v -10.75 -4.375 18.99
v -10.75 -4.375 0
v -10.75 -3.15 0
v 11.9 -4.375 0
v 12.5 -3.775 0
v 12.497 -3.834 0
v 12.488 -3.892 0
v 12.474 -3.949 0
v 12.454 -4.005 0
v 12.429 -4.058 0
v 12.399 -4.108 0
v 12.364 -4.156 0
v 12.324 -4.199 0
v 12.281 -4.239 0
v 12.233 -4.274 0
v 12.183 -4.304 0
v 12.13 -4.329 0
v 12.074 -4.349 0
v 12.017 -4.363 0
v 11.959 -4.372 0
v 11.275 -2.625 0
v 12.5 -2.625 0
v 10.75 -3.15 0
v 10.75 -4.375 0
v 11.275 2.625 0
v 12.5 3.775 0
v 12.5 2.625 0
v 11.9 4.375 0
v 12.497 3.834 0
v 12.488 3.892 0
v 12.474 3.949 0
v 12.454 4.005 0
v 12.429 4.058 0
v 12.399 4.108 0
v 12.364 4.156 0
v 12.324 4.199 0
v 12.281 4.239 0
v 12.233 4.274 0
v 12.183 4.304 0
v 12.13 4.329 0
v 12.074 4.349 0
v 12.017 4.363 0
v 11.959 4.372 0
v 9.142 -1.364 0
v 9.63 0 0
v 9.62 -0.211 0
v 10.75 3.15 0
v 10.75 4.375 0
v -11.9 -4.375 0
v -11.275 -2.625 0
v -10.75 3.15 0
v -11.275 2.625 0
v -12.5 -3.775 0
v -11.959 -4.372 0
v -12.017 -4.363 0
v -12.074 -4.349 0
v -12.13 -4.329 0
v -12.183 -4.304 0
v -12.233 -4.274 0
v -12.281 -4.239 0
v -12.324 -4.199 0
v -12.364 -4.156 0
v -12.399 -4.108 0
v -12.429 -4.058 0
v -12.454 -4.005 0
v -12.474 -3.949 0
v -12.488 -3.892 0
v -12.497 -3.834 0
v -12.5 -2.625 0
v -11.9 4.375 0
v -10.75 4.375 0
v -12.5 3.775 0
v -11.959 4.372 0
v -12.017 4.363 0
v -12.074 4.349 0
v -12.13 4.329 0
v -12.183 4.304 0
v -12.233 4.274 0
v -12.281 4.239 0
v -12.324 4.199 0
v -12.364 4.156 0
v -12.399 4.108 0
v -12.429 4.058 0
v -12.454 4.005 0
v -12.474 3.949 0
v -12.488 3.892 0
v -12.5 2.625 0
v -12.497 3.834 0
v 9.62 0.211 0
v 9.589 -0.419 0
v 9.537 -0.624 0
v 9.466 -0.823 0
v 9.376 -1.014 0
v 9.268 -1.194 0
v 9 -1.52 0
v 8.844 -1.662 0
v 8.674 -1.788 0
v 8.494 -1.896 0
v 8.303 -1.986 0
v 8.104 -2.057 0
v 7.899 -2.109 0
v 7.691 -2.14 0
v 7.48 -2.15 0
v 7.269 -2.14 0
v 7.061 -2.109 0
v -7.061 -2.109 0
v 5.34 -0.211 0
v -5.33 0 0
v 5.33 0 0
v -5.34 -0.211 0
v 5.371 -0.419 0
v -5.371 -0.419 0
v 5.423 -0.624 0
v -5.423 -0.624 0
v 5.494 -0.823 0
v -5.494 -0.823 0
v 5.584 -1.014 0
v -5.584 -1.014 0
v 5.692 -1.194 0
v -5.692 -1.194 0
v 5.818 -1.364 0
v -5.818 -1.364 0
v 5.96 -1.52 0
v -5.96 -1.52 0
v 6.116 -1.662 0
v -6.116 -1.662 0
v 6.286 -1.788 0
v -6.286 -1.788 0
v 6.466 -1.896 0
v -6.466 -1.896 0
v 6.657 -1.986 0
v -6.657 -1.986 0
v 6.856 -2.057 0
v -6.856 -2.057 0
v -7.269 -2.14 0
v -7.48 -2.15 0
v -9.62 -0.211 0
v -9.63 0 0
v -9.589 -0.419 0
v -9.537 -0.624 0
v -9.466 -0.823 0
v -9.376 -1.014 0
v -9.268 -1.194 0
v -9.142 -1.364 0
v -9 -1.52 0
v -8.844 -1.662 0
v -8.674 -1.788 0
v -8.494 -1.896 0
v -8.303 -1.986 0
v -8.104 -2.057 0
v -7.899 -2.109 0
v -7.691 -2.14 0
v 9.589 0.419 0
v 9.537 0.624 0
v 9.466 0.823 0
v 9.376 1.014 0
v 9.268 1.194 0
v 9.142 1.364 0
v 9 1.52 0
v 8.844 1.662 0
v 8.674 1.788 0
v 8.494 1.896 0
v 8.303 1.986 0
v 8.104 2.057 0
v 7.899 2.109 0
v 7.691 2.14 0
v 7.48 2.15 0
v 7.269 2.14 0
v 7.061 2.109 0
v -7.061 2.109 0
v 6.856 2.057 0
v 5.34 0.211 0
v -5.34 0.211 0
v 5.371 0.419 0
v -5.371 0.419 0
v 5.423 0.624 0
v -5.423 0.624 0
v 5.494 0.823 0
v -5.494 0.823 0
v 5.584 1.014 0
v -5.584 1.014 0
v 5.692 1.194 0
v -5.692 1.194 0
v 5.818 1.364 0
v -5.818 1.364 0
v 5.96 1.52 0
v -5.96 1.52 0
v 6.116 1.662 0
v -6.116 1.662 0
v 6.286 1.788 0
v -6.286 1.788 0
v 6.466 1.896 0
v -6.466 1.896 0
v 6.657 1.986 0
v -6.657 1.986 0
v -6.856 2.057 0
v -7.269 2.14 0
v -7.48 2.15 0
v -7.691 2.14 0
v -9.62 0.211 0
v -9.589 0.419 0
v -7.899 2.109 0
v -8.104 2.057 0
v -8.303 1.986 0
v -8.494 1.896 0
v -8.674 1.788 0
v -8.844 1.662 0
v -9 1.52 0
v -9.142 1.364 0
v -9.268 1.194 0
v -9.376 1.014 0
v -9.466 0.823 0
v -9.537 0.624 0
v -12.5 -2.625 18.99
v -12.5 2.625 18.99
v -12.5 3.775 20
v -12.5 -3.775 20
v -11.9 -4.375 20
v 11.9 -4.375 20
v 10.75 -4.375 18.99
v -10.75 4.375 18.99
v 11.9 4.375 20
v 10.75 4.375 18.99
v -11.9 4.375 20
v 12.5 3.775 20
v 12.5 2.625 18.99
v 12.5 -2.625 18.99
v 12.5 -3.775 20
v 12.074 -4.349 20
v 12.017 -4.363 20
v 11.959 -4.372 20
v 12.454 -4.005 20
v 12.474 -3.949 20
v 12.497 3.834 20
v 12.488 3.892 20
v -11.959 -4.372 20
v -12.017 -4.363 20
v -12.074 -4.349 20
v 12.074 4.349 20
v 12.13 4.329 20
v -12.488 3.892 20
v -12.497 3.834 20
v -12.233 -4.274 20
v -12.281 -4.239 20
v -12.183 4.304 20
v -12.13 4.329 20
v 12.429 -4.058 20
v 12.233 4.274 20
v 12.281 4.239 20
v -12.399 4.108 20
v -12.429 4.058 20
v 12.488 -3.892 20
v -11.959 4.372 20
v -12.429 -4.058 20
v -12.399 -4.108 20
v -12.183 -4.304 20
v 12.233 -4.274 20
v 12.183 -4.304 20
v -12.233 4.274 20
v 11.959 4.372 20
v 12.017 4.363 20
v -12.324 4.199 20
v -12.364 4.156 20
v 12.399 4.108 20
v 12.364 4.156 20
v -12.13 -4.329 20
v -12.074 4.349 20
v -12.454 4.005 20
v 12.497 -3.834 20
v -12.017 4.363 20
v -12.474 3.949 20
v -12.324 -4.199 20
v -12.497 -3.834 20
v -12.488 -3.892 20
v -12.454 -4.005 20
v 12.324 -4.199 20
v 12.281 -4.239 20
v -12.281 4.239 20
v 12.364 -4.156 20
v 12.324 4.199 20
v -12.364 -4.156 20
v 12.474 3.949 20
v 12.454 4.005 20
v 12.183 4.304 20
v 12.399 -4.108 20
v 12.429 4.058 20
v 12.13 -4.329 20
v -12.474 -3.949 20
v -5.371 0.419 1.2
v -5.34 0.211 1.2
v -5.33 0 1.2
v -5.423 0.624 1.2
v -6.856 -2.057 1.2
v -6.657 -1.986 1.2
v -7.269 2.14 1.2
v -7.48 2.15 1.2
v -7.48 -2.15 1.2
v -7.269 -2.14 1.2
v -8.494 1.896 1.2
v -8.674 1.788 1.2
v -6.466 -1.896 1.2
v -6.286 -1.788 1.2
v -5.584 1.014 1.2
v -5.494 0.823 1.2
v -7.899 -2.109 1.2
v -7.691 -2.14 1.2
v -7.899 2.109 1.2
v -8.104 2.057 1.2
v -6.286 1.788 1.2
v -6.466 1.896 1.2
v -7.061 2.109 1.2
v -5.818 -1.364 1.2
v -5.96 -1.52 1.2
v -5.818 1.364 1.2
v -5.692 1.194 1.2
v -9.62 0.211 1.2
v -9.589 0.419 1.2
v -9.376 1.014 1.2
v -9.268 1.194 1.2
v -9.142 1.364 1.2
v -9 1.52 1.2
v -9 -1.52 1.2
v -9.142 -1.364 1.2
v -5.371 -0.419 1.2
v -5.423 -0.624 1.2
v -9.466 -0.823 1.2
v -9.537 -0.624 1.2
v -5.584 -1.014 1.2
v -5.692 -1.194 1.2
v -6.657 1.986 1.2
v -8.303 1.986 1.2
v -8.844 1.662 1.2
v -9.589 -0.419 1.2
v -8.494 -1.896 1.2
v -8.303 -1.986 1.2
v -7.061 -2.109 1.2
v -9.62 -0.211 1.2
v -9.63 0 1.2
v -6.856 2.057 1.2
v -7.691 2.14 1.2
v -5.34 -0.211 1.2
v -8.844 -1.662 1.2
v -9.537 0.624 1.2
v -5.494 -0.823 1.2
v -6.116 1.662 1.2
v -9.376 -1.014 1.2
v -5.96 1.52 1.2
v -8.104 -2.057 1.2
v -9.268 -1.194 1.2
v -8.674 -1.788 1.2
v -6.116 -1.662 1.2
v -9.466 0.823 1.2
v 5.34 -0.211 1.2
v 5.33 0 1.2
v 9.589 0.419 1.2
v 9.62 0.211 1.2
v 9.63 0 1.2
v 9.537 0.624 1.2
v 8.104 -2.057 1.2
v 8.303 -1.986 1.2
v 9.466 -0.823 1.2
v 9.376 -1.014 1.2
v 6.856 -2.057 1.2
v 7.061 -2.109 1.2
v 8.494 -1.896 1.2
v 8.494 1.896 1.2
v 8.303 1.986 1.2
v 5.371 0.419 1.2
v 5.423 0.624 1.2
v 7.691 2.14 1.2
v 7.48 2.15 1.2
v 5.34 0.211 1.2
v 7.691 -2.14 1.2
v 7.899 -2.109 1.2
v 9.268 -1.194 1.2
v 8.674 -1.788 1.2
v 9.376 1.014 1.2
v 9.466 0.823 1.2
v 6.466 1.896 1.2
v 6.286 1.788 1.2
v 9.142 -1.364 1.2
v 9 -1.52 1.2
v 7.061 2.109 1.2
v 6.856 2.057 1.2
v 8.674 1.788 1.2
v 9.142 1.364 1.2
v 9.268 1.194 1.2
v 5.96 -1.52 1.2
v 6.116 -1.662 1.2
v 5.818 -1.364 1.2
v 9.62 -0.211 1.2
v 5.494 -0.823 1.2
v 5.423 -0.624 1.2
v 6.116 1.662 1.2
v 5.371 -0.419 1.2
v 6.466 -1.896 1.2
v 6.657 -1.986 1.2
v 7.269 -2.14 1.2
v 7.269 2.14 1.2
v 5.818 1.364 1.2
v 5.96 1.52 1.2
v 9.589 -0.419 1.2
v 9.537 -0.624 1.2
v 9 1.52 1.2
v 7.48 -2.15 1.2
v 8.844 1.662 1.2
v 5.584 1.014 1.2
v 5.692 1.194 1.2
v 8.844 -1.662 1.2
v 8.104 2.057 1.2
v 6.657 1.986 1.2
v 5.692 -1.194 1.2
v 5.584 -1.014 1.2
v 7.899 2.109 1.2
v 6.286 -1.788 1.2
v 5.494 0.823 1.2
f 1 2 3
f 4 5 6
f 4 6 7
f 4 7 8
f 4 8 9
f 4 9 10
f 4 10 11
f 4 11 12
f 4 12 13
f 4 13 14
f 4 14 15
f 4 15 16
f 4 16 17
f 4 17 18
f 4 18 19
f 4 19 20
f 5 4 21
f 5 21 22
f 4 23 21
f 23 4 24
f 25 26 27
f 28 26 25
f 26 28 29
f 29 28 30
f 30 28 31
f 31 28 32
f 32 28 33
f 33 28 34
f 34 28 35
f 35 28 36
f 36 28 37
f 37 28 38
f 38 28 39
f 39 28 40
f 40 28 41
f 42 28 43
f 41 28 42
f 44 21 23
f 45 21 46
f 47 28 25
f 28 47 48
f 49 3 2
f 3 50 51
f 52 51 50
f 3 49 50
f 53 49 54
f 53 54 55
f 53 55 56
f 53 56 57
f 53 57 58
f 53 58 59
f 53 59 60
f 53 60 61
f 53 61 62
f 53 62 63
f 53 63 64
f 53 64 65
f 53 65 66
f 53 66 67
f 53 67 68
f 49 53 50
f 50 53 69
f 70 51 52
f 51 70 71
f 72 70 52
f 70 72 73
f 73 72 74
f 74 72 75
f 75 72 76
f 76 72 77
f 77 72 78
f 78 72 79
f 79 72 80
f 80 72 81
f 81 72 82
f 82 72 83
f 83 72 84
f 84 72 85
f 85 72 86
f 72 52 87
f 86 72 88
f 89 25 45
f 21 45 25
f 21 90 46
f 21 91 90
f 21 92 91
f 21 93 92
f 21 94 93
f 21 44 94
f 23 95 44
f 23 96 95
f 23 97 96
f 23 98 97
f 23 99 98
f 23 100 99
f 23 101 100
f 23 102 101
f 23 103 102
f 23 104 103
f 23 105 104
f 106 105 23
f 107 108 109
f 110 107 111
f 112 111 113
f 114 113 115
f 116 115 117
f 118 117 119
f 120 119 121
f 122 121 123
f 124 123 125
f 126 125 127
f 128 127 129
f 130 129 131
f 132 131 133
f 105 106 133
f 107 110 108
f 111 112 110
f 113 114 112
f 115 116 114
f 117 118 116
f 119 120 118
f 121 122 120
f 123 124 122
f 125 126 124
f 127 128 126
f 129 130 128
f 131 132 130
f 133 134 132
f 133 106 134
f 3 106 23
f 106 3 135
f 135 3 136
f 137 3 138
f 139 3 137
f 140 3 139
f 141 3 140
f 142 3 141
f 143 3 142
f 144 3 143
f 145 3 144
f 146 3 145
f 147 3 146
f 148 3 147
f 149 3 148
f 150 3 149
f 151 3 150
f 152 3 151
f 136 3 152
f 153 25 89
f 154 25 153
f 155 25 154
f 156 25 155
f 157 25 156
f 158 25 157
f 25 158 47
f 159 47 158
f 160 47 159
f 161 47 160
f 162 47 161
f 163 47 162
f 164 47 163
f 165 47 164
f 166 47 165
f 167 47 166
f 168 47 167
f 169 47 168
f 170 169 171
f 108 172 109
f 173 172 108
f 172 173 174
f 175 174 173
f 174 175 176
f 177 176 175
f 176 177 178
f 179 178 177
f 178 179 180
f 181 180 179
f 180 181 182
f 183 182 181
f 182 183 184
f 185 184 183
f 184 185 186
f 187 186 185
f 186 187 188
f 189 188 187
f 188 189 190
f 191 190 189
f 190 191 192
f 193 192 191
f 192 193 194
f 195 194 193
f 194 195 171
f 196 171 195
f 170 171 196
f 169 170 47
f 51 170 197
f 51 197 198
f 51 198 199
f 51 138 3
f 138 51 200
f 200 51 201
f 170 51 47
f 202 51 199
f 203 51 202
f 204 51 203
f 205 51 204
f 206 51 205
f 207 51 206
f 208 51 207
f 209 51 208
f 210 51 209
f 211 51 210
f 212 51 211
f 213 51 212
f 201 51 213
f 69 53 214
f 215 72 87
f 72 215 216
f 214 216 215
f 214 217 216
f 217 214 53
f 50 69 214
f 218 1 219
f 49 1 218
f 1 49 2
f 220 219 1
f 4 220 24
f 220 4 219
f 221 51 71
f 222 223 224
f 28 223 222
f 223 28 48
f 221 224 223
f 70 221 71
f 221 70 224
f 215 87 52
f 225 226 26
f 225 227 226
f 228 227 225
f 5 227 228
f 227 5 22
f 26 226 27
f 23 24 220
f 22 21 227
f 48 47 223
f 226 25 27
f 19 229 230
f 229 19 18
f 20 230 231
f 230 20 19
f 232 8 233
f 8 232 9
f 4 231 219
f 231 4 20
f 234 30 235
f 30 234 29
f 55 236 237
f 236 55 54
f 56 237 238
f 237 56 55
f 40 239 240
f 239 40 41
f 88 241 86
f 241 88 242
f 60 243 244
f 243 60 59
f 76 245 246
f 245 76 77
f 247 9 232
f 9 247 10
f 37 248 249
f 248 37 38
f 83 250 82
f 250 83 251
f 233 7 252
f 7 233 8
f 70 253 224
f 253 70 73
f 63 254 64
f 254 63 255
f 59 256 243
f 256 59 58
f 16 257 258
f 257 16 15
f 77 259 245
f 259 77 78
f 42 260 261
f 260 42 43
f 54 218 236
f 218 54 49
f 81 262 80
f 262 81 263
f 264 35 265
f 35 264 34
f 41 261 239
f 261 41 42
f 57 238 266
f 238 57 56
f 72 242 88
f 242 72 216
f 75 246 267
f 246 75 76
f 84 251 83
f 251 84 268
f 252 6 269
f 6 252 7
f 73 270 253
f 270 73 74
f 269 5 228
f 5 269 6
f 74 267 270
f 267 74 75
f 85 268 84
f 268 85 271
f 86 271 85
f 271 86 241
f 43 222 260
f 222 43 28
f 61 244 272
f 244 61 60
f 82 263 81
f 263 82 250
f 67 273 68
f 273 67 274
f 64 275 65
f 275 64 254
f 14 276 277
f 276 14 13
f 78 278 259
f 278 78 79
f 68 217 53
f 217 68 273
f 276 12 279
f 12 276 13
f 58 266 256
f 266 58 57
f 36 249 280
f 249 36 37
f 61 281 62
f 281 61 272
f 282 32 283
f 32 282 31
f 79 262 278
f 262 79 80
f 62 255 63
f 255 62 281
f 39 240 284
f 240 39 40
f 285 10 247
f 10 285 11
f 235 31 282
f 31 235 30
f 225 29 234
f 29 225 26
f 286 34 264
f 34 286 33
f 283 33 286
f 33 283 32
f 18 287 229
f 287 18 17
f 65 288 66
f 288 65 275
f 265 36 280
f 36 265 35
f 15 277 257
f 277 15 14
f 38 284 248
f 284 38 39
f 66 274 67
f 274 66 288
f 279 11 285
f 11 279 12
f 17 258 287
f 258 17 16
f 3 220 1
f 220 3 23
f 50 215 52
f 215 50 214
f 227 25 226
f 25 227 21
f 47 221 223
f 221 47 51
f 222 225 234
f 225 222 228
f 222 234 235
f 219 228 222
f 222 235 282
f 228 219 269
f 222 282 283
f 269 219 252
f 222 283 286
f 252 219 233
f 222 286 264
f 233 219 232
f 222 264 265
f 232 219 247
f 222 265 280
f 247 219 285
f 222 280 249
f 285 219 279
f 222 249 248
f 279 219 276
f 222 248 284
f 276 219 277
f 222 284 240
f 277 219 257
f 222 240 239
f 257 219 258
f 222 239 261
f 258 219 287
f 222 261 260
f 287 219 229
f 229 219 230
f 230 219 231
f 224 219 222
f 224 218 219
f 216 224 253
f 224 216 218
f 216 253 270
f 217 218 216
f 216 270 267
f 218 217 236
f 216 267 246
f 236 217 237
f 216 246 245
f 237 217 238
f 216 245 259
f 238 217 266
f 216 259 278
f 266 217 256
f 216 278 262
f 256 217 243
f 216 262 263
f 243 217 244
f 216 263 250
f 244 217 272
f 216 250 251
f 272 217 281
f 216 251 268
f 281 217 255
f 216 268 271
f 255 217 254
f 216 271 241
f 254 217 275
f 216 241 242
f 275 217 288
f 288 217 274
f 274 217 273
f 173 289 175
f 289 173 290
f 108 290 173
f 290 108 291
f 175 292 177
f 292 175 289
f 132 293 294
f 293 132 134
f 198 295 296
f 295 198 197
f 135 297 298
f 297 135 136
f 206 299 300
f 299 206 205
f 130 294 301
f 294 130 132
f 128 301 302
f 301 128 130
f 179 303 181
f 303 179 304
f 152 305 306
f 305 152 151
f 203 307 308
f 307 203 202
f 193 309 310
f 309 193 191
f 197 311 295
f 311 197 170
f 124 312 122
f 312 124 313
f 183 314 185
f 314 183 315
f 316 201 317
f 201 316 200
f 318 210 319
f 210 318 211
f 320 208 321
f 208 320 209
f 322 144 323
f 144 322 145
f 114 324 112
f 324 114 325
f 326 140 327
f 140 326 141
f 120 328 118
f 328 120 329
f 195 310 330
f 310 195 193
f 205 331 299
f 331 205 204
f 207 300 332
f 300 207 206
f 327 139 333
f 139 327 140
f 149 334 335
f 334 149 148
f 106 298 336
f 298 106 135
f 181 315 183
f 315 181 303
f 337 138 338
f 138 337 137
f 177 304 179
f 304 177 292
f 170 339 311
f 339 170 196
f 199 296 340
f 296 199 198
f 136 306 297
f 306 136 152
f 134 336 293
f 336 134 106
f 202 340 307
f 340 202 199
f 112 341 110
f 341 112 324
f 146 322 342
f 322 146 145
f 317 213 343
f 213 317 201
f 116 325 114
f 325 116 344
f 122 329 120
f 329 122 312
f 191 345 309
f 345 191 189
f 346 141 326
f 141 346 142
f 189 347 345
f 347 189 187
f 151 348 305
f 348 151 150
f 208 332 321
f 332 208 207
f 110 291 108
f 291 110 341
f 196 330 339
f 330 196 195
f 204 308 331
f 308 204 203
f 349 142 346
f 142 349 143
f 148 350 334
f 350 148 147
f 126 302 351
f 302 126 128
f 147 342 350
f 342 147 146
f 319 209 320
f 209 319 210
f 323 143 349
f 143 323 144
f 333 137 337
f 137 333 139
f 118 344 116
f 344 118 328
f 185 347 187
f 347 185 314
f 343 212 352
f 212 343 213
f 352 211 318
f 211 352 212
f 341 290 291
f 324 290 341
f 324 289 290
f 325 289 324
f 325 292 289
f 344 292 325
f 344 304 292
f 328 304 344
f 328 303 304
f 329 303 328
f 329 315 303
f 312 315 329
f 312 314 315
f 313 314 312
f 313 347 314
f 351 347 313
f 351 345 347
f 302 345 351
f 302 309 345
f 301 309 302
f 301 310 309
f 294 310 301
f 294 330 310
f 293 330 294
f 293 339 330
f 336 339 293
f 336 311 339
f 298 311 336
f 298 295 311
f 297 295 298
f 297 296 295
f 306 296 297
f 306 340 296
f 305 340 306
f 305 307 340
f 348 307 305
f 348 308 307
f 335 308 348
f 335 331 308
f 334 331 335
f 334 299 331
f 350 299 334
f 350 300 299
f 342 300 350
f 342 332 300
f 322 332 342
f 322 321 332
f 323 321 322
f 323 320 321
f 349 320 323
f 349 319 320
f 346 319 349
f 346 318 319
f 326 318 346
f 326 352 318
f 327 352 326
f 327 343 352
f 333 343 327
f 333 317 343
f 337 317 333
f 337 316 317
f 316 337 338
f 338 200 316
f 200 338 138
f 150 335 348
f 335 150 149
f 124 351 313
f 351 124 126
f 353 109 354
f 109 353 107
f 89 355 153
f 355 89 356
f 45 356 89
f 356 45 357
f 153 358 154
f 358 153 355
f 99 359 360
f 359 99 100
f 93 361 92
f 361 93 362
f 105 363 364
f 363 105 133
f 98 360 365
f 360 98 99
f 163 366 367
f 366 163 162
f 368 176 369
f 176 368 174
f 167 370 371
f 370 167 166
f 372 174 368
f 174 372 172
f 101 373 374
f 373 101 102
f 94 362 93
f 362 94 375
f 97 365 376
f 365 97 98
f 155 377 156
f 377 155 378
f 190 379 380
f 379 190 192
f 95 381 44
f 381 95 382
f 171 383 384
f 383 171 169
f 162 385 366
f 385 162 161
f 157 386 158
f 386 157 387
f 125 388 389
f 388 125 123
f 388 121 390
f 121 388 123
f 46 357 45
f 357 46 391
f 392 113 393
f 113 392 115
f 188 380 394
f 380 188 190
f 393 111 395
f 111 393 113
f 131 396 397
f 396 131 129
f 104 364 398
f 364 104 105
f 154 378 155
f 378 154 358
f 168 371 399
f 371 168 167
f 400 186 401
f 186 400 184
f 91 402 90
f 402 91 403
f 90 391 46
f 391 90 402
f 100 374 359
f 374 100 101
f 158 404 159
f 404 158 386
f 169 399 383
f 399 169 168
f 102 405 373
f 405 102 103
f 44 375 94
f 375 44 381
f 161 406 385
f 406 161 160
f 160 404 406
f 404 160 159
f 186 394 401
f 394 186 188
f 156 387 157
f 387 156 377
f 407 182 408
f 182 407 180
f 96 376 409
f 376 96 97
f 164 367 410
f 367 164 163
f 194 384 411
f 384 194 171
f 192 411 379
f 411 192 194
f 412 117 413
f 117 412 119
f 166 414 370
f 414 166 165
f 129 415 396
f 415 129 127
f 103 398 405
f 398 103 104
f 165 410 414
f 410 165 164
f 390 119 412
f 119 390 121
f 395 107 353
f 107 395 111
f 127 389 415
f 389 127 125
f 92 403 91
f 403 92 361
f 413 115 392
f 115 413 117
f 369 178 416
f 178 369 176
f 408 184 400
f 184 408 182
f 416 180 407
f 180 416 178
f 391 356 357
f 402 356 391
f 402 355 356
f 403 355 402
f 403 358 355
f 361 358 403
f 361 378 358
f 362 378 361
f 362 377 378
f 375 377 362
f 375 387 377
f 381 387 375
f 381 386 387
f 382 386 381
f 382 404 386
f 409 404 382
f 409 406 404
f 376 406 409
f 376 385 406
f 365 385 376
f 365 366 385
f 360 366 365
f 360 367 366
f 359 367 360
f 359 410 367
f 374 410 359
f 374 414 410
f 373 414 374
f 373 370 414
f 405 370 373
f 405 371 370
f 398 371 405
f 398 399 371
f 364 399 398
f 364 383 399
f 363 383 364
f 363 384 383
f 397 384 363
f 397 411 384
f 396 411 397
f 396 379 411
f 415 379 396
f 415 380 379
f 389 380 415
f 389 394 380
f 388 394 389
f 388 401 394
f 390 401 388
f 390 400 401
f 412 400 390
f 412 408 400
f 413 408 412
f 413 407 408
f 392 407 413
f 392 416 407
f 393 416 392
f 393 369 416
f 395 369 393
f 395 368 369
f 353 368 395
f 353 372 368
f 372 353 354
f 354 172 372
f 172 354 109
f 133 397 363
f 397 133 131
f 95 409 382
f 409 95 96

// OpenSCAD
// hallway / console — a console / hall table token: a narrow table meant to
// stand against a wall, built like diningroom/table.scad's "stands proud"
// trick — a thin top slab over a body set back from the edge, with a leg at
// each corner, kept as one solid, support-free block.
//
// Width/Depth are the real-world top in cm: a console runs the length of a
// hallway wall (Width) but stays shallow front-to-back (Depth), so it reads
// on the plan as a thin strip rather than a full table. Height is the real height
// of the top — a hall console stands a little above table height — shrunk by the
// plan scale like the footprint (see printed_h() in lib/common.scad).

include <../lib/common.scad>

Width  = 100;  // cm
Depth  = 35;   // cm
Height = 80;   // cm — the top

// the printed height, mm: Height at the plan scale
Print_h = printed_h(Height);

// The top slab, in real cm — the only part of the token at full footprint, so its
// edge is the line you read the size off.
Top_h = 4;
// How far the body under the top is set back from the edge, in real cm. It
// stands in for the open space under a real console, but it is a slope, not
// a step, and it is clamped below (see console()) — on a top this shallow
// the clamp mostly wins, so the body ends up close to full width anyway.
Setback = 16;
// A leg at each corner of the top, Leg cm square, flush with the edge.
Show_legs = true;
Leg       = 7;   // cm

// A single drawer seam under the front edge (-Y), cut into the top face: a
// thin groove hinting at one drawer without a full drawers() symbol on a top
// this shallow. Off by default — most consoles in this set are open shelves.
Show_drawer = false;
Drawer_w    = 70;  // cm, seam width, centred on the piece
Drawer_gap  = 5;   // cm, how far the seam sits in from the front edge
Drawer_seam = 2;   // cm, seam thickness — prints about one Symbol_stroke wide

// Magnet pockets in the bottom face, in a row along the length (0 = none).
// Two keep the piece from pivoting on the board; see Magnet_* in
// lib/common.scad. A 35 cm-deep top is 8.75 mm across at 1:40 — wide enough
// for a 4 mm disc.
Magnets = 2;

console();

module console() {
    body_h   = Print_h - rise(Top_h);
    // Clamped exactly like table.scad: never lean out more than 45 deg
    // (body_h), and always leave a base wide enough for a magnet pocket.
    base_min = magnet_min_span(magnet_d_for(Width, Depth));
    back     = max(0, min(cm(Setback), body_h,
                          (min(cm(Width), cm(Depth)) - base_min) / 2));
    difference() {
        union() {
            // the body: full footprint where it meets the top, set back at
            // the floor
            hull() {
                linear_extrude(height = 0.01)
                    offset(delta = -back) footprint_2d(Width, Depth);
                translate([0, 0, body_h - 0.01])
                    linear_extrude(height = 0.01) footprint_2d(Width, Depth);
            }
            if (Show_legs)
                legs(body_h);
            translate([0, 0, body_h])
                linear_extrude(height = rise(Top_h)) footprint_2d(Width, Depth);
        }
        if (Show_drawer)
            groove(0, -(Depth / 2 - Drawer_gap), Drawer_w, Drawer_seam, Print_h);
        if (Magnets > 0)
            magnets(Width, Depth, Magnets);
    }
}

// Legs, <h> mm tall, clipped to the outline so a rounded corner stays
// rounded — one at each corner of the top.
module legs(h) {
    intersection() {
        linear_extrude(height = h) footprint_2d(Width, Depth);
        for (x = [-1, 1], y = [-1, 1])
            translate([x * (cm(Width) - cm(Leg)) / 2,
                       y * (cm(Depth) - cm(Leg)) / 2, h / 2])
                cube([cm(Leg), cm(Leg), h], center = true);
    }
}
